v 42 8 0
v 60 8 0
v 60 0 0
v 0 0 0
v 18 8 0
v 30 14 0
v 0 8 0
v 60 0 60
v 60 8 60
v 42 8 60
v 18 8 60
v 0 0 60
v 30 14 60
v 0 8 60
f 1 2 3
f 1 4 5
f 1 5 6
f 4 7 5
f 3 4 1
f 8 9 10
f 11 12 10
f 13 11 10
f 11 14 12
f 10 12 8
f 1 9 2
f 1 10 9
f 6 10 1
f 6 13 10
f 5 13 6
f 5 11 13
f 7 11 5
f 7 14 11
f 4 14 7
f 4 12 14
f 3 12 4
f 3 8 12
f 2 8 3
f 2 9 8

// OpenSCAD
$fn = 32;

// ----------------------------------------------------------------------
// V guide rail: vrib, 60 mm wide
// ----------------------------------------------------------------------

// --- parameters (mm) ---
rail_w = 60;              // rail width, X
base_t = 8;               // base plate thickness
v_depth = 6;              // V feature depth / height
v_half_w = 12;            // half width of the V at the base face
plate_t = 60;             // rail length, Z (the extrusion height)

profile = [[0, 0], [60, 0], [60, 8], [42, 8], [30, 14], [18, 8], [0, 8]];  // primary outline, 7 points, counter clockwise

// --- the one profile operation ---
linear_extrude(height = plate_t) polygon(points = profile);
